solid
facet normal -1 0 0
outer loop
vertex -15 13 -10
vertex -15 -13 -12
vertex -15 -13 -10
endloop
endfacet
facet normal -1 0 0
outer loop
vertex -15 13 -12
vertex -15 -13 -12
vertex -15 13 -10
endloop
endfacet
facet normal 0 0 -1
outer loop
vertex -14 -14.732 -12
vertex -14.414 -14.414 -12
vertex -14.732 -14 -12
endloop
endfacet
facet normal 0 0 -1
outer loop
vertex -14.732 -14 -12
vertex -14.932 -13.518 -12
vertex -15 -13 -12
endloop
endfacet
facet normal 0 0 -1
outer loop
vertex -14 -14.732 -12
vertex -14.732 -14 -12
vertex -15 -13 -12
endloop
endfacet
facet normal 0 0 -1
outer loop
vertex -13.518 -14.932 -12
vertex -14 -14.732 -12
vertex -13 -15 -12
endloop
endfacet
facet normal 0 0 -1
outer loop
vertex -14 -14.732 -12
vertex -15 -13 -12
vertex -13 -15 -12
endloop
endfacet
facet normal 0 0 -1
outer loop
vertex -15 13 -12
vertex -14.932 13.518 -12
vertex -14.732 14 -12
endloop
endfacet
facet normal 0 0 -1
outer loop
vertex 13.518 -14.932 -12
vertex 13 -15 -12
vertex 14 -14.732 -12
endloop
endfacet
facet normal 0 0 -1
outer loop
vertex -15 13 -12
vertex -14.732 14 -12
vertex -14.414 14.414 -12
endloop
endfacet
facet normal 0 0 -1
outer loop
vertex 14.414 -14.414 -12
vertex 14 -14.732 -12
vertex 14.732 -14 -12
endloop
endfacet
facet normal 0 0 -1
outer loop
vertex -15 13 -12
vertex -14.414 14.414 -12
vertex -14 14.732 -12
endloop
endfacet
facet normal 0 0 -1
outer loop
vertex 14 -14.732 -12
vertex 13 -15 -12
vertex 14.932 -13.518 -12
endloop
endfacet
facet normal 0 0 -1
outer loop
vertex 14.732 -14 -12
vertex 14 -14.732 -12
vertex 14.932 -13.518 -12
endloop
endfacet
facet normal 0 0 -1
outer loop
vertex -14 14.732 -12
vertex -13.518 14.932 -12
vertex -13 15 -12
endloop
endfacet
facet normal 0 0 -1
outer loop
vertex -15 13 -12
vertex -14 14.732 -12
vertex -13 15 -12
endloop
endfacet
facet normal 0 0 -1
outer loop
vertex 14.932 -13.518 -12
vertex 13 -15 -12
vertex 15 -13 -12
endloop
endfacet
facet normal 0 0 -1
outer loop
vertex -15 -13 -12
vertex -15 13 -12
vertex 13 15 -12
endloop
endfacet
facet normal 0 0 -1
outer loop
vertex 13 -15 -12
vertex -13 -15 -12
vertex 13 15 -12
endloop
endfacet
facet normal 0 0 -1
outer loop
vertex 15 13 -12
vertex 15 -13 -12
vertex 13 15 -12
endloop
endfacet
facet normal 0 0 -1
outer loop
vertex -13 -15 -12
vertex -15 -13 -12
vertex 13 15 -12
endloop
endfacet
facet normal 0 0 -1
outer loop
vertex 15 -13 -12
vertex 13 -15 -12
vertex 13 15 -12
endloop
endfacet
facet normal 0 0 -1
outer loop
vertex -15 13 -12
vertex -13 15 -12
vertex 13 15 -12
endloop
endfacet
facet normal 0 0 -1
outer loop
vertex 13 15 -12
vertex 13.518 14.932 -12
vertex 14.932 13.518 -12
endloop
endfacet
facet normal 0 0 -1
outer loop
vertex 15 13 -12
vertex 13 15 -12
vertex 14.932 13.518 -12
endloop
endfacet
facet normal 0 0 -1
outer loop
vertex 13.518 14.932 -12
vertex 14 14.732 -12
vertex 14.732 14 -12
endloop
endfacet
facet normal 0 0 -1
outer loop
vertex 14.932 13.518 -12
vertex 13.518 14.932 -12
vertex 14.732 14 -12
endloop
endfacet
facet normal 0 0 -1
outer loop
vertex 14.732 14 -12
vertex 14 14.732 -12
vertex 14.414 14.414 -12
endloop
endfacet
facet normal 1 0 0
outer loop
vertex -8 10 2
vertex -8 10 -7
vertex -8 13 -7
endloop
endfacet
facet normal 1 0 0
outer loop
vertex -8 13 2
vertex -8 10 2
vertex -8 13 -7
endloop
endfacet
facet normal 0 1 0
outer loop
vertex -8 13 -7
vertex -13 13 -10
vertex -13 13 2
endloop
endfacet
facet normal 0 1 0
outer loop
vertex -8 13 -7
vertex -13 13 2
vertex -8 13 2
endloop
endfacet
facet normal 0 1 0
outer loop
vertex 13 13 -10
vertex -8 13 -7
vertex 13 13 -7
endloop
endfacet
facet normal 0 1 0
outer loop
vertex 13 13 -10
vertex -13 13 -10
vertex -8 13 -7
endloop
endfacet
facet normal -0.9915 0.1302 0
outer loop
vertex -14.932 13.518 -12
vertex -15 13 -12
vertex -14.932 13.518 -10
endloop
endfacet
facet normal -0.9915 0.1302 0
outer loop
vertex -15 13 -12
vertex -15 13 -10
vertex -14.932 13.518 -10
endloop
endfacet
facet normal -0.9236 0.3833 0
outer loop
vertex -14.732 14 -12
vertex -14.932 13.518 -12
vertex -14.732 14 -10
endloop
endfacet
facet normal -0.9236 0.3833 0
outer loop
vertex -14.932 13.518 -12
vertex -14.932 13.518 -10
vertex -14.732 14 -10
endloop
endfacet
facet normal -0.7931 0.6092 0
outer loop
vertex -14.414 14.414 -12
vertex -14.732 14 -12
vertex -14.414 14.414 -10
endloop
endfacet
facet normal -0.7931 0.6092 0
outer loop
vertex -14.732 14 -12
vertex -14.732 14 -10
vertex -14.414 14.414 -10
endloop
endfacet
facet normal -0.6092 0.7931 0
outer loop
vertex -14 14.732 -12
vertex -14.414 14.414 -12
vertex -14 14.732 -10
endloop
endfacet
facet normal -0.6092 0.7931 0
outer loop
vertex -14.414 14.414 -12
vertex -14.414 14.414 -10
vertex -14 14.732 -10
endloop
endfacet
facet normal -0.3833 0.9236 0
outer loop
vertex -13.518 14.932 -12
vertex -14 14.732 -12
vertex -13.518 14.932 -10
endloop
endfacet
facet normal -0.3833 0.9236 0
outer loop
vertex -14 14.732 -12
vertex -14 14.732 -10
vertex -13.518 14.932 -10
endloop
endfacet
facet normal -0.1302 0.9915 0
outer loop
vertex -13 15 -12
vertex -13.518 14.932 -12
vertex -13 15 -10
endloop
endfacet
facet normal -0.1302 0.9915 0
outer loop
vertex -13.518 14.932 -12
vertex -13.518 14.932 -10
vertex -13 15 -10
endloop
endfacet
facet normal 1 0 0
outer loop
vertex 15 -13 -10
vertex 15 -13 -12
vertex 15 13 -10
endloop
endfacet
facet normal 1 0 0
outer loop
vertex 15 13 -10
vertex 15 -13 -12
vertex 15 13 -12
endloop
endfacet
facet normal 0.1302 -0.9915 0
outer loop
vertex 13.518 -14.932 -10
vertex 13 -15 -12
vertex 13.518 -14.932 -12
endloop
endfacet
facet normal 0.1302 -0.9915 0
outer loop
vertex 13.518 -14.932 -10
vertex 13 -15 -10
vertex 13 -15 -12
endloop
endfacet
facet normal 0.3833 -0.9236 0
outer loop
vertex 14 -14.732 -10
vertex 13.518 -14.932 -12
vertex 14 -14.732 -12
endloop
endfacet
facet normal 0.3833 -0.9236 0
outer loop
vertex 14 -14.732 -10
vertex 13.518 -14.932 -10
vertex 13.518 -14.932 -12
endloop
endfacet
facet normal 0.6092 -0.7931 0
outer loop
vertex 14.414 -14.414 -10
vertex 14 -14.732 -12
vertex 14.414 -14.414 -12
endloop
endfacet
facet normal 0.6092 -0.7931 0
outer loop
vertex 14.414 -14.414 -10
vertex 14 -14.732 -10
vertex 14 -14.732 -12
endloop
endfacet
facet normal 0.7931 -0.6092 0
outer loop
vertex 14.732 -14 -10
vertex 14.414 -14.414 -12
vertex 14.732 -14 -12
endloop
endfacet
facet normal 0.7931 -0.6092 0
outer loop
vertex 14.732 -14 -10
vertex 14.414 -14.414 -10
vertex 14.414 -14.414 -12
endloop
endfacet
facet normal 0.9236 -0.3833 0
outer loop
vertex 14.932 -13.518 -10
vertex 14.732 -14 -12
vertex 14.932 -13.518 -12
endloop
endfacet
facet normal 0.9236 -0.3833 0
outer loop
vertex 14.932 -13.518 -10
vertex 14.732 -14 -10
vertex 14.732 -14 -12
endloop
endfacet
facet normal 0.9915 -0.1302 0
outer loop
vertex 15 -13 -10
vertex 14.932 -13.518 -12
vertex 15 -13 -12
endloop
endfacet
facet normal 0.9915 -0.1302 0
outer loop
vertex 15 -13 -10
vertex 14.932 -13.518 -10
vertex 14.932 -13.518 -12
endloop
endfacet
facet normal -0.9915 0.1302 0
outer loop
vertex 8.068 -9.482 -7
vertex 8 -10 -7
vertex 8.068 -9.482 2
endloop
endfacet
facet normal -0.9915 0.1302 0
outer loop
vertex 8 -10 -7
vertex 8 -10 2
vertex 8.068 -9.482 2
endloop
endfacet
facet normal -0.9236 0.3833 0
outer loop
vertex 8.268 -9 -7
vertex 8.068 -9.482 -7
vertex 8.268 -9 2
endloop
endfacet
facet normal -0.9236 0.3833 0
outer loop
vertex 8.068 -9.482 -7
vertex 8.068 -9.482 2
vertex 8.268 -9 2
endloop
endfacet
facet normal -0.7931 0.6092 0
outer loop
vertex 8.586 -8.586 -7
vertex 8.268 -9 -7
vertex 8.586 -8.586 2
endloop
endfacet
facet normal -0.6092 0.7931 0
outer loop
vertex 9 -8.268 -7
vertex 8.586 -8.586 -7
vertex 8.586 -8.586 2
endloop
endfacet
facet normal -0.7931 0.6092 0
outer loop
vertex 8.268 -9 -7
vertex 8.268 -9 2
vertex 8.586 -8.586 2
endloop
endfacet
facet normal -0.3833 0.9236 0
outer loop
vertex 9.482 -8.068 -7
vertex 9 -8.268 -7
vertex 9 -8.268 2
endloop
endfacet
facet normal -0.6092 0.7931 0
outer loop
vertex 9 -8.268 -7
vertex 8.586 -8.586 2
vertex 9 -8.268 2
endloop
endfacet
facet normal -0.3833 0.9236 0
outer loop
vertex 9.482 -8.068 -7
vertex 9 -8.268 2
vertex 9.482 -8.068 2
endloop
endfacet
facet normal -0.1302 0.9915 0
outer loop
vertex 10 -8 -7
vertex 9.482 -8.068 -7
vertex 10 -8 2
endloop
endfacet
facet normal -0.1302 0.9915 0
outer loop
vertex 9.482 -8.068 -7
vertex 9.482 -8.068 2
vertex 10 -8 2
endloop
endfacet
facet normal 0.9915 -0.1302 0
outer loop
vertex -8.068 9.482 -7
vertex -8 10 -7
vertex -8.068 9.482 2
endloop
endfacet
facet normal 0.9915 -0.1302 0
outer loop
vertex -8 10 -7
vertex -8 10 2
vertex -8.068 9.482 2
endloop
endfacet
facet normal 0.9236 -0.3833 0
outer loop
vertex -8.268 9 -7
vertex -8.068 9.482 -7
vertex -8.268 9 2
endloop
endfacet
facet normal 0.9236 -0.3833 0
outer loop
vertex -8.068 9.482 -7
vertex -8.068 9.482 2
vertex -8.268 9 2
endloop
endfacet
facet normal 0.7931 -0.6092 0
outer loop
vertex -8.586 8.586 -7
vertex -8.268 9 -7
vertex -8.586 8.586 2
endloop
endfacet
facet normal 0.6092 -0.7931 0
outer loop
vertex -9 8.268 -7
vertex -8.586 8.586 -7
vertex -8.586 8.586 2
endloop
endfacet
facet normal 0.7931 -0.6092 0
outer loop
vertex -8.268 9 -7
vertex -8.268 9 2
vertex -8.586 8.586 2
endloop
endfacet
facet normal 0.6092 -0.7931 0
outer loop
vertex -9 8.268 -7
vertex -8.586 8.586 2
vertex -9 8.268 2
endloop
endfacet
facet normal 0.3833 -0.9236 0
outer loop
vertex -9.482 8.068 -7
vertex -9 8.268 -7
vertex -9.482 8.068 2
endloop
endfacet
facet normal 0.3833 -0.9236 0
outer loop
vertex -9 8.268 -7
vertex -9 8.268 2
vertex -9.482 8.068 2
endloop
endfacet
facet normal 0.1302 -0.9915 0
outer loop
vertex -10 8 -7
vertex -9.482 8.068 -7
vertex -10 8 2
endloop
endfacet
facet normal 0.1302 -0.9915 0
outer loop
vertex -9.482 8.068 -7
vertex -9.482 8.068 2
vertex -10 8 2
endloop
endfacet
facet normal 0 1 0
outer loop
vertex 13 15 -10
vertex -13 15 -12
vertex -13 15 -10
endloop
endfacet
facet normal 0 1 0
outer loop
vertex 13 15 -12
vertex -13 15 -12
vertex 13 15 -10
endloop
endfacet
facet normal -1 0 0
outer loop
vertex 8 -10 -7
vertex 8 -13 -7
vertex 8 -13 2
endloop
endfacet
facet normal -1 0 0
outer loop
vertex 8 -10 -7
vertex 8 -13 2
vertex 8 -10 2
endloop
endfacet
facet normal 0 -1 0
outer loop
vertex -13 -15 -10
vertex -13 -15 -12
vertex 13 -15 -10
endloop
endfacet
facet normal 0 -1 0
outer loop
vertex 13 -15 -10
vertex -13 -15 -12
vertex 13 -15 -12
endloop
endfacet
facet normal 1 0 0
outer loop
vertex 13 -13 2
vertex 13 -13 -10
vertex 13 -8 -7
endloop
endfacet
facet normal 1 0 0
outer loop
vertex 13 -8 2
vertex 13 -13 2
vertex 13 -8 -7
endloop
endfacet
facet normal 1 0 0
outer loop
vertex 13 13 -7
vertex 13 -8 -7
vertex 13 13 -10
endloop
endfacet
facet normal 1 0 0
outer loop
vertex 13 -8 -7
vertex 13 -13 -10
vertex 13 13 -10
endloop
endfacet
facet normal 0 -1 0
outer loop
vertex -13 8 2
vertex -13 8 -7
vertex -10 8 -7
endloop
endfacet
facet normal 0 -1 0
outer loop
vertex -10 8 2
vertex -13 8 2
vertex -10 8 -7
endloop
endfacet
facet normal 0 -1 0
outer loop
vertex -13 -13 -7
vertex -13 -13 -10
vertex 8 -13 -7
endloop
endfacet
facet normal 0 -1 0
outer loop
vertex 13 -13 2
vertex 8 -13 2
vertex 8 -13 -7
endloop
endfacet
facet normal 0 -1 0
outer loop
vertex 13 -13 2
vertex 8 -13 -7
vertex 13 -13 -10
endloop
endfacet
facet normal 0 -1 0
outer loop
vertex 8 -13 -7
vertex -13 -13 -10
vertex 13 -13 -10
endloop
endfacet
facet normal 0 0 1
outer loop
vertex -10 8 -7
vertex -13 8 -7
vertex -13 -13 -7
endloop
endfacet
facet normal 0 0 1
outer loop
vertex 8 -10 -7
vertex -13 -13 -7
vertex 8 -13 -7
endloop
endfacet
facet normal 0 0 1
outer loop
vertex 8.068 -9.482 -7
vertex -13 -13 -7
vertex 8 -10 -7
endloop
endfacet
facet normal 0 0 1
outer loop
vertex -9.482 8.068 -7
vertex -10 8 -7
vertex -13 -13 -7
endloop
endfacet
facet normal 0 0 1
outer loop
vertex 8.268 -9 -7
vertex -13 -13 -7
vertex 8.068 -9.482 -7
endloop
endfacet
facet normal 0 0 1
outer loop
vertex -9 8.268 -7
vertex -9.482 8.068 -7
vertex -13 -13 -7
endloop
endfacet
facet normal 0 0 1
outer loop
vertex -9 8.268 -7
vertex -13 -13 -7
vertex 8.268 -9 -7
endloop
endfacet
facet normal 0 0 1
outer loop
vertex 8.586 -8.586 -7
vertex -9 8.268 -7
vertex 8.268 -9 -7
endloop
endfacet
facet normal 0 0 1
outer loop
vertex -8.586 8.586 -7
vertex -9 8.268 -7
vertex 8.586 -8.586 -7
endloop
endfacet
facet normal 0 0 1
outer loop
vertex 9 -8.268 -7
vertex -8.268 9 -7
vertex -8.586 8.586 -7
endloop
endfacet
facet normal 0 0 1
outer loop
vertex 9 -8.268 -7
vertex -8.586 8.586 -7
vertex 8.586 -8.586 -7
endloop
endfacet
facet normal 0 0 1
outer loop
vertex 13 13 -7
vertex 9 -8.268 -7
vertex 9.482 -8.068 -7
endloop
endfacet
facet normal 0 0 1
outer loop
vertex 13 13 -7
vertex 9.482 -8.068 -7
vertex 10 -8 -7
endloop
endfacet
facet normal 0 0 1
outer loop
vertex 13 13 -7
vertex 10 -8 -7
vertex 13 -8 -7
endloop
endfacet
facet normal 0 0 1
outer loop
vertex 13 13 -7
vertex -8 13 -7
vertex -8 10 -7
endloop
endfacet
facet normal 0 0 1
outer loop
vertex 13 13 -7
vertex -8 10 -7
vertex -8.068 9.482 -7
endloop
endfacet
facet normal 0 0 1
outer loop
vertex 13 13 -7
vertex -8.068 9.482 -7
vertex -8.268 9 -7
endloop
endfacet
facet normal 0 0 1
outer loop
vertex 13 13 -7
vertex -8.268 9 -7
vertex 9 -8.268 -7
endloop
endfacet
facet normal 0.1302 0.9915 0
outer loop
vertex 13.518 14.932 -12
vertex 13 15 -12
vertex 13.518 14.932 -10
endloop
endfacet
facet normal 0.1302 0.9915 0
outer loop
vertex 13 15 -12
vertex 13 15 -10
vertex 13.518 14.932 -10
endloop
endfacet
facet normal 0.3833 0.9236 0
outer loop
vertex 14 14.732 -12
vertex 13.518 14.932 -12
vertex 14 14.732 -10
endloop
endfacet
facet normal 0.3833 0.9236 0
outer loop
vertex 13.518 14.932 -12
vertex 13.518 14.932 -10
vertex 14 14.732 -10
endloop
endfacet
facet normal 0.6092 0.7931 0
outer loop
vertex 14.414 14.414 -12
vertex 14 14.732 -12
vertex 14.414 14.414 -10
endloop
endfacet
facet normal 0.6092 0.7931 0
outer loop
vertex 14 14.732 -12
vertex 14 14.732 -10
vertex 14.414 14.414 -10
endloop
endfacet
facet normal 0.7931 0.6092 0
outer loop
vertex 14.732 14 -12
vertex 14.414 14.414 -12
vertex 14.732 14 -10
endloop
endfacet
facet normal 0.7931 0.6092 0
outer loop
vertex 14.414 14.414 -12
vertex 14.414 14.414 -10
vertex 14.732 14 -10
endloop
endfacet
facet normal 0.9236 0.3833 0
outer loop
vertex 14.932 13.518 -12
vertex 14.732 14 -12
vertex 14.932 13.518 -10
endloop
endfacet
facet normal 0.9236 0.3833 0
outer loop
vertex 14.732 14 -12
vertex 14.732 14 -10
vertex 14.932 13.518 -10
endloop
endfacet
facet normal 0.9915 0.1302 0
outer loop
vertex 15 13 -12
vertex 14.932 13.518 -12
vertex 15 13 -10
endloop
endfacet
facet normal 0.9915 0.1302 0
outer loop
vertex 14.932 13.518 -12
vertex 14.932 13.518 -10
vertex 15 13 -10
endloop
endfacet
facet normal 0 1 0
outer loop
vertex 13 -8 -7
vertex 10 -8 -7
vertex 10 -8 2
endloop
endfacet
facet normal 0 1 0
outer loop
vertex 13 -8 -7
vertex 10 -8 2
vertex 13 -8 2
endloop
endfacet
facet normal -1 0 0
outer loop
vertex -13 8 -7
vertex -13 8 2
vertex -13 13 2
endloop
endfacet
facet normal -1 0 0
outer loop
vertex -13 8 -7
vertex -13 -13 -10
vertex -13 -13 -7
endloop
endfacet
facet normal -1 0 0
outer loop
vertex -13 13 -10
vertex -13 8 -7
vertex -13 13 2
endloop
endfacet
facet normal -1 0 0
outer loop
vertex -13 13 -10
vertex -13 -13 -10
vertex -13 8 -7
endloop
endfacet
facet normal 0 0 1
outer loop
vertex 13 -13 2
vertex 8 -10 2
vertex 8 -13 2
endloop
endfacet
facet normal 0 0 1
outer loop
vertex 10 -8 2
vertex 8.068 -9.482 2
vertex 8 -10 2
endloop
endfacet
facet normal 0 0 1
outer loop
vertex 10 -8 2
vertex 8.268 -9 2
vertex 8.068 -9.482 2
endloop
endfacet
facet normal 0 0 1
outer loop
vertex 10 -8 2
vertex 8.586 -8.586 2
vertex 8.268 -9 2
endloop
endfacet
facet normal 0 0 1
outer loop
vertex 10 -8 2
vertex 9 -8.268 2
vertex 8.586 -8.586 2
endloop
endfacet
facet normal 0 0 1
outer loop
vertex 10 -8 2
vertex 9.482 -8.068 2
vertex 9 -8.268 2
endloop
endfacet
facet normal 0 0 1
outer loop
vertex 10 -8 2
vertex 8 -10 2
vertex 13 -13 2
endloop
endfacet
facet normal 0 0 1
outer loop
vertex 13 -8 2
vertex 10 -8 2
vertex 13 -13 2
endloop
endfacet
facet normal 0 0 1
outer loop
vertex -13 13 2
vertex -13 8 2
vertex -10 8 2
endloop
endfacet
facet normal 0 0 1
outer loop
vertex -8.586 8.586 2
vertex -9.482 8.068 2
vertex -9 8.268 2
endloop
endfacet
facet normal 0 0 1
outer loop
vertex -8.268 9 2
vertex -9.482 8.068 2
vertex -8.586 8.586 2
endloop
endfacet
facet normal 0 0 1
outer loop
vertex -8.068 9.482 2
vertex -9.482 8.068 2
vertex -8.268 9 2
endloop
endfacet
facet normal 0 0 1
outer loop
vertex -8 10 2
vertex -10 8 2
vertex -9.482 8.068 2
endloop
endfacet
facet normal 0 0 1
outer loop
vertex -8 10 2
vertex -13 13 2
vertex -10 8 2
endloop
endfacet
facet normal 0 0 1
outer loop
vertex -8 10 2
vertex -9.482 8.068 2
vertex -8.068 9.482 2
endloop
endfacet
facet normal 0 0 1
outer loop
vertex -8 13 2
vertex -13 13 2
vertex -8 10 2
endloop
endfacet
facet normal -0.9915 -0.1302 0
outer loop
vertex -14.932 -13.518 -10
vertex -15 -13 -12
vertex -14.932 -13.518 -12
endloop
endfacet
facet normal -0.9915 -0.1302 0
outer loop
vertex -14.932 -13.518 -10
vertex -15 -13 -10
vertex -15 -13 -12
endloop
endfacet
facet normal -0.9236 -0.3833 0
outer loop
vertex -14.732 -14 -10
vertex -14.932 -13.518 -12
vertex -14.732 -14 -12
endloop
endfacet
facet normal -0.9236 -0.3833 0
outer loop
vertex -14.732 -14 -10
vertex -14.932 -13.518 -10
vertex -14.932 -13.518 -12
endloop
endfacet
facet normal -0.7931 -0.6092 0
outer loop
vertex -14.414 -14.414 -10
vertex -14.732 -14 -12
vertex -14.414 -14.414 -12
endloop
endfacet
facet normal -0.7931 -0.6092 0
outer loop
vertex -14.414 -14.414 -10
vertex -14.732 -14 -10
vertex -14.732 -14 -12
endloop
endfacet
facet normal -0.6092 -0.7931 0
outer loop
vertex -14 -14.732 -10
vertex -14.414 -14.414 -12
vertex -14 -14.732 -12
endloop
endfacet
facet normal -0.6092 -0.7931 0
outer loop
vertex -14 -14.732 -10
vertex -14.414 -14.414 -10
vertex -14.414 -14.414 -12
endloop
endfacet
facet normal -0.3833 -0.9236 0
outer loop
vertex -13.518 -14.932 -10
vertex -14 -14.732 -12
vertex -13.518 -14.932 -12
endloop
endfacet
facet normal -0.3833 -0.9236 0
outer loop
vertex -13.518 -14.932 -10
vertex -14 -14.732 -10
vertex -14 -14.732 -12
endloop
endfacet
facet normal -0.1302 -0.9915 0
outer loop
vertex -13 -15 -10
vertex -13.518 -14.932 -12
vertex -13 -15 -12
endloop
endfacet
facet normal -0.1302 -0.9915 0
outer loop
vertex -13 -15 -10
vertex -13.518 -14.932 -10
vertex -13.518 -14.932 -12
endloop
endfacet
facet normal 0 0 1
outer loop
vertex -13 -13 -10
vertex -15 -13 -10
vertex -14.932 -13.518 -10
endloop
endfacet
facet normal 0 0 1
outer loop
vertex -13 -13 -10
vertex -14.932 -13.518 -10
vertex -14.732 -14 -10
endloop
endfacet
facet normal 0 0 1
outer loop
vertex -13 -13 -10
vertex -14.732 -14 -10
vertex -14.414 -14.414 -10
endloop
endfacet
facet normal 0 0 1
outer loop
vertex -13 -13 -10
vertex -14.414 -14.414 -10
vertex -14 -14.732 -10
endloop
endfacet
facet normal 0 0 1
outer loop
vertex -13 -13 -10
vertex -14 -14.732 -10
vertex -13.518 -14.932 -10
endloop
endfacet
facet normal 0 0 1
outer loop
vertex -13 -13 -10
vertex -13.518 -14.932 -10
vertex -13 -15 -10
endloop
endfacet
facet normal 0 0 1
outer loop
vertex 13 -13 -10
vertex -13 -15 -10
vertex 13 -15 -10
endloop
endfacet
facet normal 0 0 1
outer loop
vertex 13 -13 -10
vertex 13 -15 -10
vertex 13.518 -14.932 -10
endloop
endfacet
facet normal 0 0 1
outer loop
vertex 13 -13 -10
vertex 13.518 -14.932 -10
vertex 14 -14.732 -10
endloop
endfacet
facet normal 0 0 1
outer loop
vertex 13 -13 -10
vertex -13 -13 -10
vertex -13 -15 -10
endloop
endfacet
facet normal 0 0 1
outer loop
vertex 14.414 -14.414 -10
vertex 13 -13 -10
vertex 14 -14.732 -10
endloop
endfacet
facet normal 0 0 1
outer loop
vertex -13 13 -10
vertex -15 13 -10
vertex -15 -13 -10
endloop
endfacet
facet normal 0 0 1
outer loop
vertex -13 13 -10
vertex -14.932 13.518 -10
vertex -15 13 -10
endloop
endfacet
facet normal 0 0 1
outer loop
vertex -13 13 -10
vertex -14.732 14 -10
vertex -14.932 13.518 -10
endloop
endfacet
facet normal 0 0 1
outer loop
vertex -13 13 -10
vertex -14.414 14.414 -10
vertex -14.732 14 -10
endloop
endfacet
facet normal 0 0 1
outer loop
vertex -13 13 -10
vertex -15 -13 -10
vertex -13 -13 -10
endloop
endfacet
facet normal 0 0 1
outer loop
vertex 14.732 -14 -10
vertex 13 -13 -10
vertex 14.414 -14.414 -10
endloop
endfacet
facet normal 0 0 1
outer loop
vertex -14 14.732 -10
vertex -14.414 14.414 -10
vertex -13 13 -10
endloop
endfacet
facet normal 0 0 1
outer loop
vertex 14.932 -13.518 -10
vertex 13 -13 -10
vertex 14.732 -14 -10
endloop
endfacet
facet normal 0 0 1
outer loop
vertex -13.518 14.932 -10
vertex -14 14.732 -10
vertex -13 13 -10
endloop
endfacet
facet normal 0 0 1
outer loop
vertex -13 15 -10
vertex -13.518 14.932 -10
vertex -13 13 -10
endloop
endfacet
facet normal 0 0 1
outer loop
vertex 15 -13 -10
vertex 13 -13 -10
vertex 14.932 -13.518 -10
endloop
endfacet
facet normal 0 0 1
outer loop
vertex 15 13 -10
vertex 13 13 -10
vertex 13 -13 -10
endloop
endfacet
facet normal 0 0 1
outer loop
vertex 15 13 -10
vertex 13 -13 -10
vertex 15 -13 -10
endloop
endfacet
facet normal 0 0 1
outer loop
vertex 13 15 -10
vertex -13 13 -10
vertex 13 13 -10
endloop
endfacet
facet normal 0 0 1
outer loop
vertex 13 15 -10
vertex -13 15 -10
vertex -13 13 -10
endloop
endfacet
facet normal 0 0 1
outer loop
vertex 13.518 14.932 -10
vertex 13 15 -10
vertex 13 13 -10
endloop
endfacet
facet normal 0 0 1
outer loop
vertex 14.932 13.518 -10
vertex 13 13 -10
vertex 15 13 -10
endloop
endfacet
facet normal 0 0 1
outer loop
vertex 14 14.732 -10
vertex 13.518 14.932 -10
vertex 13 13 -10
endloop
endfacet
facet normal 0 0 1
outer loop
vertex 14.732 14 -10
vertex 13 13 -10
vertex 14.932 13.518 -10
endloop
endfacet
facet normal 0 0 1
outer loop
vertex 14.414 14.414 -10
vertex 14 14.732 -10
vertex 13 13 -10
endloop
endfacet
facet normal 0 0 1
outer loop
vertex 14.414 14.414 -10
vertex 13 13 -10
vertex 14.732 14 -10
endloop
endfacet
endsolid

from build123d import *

# Parameters (mm, degrees)
BOX013_W     = 26
BOX013_H     = 26
BOX013_DEPTH = 3
BOX014_W     = 5
BOX014_H     = 5
BOX014_DEPTH = 9
BOX012_W     = 30
BOX012_H     = 30
BOX012_DEPTH = 2
BOX015_W     = 5
BOX015_H     = 5
BOX015_DEPTH = 9
FILLET001_R  = 2
FILLET002_R  = 2


with BuildPart() as kapakic:
    # Box013 → Box013 (new body)
    with BuildSketch(Plane(origin=(-13, -13, -10), x_dir=(1, 0, 0), z_dir=(0, 0, 1))):
        with Locations((13, 13)):
            Rectangle(BOX013_W, BOX013_H)
    extrude(amount=BOX013_DEPTH)


with BuildPart() as kapakcikinti1:
    # Box014 → Box014 (new body)
    with BuildSketch(Plane(origin=(-13, 8, -7), x_dir=(1, 0, 0), z_dir=(0, 0, 1))):
        with Locations((2.5, 2.5)):
            Rectangle(BOX014_W, BOX014_H)
    extrude(amount=BOX014_DEPTH)


with BuildPart() as kapakgenis:
    # Box012 → Box012 (new body)
    with BuildSketch(Plane(origin=(-15, -15, -12), x_dir=(1, 0, 0), z_dir=(0, 0, 1))):
        with Locations((15, 15)):
            Rectangle(BOX012_W, BOX012_H)
    extrude(amount=BOX012_DEPTH)


with BuildPart() as fillet002:
    # Box015 → Box015 (new body)
    with BuildSketch(Plane(origin=(8, -13, -7), x_dir=(1, 0, 0), z_dir=(0, 0, 1))):
        with Locations((2.5, 2.5)):
            Rectangle(BOX015_W, BOX015_H)
    extrude(amount=BOX015_DEPTH)

    # Fusion004: union KapakIc, KapakCikinti1, KapakGenis
    add(kapakic.part)
    add(kapakcikinti1.part)
    add(kapakgenis.part)

    # Fillet001
    fillet001_edges = [fillet002.edges().sort_by_distance(p)[0] for p in [
        (-15, -15, -11),
        (-15, 15, -11),
        (15, 15, -11),
        (15, -15, -11),
    ]]
    fillet(fillet001_edges, radius=FILLET001_R)

    # Fillet002
    fillet002_edges = [fillet002.edges().sort_by_distance(p)[0] for p in [
        (-8, 8, -2.5),
        (8, -8, -2.5),
    ]]
    fillet(fillet002_edges, radius=FILLET002_R)


solid = fillet002.part
